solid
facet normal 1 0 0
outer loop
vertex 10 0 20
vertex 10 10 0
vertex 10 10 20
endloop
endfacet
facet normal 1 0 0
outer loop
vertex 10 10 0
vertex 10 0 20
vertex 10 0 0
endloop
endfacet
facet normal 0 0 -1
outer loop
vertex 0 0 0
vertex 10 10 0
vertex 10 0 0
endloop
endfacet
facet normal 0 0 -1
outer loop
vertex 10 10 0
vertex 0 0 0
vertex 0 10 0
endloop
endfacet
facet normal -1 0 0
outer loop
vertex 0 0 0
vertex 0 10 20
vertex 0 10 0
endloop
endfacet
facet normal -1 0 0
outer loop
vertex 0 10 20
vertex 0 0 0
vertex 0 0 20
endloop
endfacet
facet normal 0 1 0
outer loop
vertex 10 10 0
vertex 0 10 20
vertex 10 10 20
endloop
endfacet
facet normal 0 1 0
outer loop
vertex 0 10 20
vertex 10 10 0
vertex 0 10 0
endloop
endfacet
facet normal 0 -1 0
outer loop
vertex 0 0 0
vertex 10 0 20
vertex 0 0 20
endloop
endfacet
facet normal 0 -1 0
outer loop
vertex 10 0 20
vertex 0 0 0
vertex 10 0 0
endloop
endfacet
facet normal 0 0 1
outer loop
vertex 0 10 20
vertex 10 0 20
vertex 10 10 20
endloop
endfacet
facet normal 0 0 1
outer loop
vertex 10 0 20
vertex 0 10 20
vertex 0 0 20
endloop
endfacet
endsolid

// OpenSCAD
union(){ cube([10,10,10]); translate([0,0,10]) cube([10,10,10]); }
